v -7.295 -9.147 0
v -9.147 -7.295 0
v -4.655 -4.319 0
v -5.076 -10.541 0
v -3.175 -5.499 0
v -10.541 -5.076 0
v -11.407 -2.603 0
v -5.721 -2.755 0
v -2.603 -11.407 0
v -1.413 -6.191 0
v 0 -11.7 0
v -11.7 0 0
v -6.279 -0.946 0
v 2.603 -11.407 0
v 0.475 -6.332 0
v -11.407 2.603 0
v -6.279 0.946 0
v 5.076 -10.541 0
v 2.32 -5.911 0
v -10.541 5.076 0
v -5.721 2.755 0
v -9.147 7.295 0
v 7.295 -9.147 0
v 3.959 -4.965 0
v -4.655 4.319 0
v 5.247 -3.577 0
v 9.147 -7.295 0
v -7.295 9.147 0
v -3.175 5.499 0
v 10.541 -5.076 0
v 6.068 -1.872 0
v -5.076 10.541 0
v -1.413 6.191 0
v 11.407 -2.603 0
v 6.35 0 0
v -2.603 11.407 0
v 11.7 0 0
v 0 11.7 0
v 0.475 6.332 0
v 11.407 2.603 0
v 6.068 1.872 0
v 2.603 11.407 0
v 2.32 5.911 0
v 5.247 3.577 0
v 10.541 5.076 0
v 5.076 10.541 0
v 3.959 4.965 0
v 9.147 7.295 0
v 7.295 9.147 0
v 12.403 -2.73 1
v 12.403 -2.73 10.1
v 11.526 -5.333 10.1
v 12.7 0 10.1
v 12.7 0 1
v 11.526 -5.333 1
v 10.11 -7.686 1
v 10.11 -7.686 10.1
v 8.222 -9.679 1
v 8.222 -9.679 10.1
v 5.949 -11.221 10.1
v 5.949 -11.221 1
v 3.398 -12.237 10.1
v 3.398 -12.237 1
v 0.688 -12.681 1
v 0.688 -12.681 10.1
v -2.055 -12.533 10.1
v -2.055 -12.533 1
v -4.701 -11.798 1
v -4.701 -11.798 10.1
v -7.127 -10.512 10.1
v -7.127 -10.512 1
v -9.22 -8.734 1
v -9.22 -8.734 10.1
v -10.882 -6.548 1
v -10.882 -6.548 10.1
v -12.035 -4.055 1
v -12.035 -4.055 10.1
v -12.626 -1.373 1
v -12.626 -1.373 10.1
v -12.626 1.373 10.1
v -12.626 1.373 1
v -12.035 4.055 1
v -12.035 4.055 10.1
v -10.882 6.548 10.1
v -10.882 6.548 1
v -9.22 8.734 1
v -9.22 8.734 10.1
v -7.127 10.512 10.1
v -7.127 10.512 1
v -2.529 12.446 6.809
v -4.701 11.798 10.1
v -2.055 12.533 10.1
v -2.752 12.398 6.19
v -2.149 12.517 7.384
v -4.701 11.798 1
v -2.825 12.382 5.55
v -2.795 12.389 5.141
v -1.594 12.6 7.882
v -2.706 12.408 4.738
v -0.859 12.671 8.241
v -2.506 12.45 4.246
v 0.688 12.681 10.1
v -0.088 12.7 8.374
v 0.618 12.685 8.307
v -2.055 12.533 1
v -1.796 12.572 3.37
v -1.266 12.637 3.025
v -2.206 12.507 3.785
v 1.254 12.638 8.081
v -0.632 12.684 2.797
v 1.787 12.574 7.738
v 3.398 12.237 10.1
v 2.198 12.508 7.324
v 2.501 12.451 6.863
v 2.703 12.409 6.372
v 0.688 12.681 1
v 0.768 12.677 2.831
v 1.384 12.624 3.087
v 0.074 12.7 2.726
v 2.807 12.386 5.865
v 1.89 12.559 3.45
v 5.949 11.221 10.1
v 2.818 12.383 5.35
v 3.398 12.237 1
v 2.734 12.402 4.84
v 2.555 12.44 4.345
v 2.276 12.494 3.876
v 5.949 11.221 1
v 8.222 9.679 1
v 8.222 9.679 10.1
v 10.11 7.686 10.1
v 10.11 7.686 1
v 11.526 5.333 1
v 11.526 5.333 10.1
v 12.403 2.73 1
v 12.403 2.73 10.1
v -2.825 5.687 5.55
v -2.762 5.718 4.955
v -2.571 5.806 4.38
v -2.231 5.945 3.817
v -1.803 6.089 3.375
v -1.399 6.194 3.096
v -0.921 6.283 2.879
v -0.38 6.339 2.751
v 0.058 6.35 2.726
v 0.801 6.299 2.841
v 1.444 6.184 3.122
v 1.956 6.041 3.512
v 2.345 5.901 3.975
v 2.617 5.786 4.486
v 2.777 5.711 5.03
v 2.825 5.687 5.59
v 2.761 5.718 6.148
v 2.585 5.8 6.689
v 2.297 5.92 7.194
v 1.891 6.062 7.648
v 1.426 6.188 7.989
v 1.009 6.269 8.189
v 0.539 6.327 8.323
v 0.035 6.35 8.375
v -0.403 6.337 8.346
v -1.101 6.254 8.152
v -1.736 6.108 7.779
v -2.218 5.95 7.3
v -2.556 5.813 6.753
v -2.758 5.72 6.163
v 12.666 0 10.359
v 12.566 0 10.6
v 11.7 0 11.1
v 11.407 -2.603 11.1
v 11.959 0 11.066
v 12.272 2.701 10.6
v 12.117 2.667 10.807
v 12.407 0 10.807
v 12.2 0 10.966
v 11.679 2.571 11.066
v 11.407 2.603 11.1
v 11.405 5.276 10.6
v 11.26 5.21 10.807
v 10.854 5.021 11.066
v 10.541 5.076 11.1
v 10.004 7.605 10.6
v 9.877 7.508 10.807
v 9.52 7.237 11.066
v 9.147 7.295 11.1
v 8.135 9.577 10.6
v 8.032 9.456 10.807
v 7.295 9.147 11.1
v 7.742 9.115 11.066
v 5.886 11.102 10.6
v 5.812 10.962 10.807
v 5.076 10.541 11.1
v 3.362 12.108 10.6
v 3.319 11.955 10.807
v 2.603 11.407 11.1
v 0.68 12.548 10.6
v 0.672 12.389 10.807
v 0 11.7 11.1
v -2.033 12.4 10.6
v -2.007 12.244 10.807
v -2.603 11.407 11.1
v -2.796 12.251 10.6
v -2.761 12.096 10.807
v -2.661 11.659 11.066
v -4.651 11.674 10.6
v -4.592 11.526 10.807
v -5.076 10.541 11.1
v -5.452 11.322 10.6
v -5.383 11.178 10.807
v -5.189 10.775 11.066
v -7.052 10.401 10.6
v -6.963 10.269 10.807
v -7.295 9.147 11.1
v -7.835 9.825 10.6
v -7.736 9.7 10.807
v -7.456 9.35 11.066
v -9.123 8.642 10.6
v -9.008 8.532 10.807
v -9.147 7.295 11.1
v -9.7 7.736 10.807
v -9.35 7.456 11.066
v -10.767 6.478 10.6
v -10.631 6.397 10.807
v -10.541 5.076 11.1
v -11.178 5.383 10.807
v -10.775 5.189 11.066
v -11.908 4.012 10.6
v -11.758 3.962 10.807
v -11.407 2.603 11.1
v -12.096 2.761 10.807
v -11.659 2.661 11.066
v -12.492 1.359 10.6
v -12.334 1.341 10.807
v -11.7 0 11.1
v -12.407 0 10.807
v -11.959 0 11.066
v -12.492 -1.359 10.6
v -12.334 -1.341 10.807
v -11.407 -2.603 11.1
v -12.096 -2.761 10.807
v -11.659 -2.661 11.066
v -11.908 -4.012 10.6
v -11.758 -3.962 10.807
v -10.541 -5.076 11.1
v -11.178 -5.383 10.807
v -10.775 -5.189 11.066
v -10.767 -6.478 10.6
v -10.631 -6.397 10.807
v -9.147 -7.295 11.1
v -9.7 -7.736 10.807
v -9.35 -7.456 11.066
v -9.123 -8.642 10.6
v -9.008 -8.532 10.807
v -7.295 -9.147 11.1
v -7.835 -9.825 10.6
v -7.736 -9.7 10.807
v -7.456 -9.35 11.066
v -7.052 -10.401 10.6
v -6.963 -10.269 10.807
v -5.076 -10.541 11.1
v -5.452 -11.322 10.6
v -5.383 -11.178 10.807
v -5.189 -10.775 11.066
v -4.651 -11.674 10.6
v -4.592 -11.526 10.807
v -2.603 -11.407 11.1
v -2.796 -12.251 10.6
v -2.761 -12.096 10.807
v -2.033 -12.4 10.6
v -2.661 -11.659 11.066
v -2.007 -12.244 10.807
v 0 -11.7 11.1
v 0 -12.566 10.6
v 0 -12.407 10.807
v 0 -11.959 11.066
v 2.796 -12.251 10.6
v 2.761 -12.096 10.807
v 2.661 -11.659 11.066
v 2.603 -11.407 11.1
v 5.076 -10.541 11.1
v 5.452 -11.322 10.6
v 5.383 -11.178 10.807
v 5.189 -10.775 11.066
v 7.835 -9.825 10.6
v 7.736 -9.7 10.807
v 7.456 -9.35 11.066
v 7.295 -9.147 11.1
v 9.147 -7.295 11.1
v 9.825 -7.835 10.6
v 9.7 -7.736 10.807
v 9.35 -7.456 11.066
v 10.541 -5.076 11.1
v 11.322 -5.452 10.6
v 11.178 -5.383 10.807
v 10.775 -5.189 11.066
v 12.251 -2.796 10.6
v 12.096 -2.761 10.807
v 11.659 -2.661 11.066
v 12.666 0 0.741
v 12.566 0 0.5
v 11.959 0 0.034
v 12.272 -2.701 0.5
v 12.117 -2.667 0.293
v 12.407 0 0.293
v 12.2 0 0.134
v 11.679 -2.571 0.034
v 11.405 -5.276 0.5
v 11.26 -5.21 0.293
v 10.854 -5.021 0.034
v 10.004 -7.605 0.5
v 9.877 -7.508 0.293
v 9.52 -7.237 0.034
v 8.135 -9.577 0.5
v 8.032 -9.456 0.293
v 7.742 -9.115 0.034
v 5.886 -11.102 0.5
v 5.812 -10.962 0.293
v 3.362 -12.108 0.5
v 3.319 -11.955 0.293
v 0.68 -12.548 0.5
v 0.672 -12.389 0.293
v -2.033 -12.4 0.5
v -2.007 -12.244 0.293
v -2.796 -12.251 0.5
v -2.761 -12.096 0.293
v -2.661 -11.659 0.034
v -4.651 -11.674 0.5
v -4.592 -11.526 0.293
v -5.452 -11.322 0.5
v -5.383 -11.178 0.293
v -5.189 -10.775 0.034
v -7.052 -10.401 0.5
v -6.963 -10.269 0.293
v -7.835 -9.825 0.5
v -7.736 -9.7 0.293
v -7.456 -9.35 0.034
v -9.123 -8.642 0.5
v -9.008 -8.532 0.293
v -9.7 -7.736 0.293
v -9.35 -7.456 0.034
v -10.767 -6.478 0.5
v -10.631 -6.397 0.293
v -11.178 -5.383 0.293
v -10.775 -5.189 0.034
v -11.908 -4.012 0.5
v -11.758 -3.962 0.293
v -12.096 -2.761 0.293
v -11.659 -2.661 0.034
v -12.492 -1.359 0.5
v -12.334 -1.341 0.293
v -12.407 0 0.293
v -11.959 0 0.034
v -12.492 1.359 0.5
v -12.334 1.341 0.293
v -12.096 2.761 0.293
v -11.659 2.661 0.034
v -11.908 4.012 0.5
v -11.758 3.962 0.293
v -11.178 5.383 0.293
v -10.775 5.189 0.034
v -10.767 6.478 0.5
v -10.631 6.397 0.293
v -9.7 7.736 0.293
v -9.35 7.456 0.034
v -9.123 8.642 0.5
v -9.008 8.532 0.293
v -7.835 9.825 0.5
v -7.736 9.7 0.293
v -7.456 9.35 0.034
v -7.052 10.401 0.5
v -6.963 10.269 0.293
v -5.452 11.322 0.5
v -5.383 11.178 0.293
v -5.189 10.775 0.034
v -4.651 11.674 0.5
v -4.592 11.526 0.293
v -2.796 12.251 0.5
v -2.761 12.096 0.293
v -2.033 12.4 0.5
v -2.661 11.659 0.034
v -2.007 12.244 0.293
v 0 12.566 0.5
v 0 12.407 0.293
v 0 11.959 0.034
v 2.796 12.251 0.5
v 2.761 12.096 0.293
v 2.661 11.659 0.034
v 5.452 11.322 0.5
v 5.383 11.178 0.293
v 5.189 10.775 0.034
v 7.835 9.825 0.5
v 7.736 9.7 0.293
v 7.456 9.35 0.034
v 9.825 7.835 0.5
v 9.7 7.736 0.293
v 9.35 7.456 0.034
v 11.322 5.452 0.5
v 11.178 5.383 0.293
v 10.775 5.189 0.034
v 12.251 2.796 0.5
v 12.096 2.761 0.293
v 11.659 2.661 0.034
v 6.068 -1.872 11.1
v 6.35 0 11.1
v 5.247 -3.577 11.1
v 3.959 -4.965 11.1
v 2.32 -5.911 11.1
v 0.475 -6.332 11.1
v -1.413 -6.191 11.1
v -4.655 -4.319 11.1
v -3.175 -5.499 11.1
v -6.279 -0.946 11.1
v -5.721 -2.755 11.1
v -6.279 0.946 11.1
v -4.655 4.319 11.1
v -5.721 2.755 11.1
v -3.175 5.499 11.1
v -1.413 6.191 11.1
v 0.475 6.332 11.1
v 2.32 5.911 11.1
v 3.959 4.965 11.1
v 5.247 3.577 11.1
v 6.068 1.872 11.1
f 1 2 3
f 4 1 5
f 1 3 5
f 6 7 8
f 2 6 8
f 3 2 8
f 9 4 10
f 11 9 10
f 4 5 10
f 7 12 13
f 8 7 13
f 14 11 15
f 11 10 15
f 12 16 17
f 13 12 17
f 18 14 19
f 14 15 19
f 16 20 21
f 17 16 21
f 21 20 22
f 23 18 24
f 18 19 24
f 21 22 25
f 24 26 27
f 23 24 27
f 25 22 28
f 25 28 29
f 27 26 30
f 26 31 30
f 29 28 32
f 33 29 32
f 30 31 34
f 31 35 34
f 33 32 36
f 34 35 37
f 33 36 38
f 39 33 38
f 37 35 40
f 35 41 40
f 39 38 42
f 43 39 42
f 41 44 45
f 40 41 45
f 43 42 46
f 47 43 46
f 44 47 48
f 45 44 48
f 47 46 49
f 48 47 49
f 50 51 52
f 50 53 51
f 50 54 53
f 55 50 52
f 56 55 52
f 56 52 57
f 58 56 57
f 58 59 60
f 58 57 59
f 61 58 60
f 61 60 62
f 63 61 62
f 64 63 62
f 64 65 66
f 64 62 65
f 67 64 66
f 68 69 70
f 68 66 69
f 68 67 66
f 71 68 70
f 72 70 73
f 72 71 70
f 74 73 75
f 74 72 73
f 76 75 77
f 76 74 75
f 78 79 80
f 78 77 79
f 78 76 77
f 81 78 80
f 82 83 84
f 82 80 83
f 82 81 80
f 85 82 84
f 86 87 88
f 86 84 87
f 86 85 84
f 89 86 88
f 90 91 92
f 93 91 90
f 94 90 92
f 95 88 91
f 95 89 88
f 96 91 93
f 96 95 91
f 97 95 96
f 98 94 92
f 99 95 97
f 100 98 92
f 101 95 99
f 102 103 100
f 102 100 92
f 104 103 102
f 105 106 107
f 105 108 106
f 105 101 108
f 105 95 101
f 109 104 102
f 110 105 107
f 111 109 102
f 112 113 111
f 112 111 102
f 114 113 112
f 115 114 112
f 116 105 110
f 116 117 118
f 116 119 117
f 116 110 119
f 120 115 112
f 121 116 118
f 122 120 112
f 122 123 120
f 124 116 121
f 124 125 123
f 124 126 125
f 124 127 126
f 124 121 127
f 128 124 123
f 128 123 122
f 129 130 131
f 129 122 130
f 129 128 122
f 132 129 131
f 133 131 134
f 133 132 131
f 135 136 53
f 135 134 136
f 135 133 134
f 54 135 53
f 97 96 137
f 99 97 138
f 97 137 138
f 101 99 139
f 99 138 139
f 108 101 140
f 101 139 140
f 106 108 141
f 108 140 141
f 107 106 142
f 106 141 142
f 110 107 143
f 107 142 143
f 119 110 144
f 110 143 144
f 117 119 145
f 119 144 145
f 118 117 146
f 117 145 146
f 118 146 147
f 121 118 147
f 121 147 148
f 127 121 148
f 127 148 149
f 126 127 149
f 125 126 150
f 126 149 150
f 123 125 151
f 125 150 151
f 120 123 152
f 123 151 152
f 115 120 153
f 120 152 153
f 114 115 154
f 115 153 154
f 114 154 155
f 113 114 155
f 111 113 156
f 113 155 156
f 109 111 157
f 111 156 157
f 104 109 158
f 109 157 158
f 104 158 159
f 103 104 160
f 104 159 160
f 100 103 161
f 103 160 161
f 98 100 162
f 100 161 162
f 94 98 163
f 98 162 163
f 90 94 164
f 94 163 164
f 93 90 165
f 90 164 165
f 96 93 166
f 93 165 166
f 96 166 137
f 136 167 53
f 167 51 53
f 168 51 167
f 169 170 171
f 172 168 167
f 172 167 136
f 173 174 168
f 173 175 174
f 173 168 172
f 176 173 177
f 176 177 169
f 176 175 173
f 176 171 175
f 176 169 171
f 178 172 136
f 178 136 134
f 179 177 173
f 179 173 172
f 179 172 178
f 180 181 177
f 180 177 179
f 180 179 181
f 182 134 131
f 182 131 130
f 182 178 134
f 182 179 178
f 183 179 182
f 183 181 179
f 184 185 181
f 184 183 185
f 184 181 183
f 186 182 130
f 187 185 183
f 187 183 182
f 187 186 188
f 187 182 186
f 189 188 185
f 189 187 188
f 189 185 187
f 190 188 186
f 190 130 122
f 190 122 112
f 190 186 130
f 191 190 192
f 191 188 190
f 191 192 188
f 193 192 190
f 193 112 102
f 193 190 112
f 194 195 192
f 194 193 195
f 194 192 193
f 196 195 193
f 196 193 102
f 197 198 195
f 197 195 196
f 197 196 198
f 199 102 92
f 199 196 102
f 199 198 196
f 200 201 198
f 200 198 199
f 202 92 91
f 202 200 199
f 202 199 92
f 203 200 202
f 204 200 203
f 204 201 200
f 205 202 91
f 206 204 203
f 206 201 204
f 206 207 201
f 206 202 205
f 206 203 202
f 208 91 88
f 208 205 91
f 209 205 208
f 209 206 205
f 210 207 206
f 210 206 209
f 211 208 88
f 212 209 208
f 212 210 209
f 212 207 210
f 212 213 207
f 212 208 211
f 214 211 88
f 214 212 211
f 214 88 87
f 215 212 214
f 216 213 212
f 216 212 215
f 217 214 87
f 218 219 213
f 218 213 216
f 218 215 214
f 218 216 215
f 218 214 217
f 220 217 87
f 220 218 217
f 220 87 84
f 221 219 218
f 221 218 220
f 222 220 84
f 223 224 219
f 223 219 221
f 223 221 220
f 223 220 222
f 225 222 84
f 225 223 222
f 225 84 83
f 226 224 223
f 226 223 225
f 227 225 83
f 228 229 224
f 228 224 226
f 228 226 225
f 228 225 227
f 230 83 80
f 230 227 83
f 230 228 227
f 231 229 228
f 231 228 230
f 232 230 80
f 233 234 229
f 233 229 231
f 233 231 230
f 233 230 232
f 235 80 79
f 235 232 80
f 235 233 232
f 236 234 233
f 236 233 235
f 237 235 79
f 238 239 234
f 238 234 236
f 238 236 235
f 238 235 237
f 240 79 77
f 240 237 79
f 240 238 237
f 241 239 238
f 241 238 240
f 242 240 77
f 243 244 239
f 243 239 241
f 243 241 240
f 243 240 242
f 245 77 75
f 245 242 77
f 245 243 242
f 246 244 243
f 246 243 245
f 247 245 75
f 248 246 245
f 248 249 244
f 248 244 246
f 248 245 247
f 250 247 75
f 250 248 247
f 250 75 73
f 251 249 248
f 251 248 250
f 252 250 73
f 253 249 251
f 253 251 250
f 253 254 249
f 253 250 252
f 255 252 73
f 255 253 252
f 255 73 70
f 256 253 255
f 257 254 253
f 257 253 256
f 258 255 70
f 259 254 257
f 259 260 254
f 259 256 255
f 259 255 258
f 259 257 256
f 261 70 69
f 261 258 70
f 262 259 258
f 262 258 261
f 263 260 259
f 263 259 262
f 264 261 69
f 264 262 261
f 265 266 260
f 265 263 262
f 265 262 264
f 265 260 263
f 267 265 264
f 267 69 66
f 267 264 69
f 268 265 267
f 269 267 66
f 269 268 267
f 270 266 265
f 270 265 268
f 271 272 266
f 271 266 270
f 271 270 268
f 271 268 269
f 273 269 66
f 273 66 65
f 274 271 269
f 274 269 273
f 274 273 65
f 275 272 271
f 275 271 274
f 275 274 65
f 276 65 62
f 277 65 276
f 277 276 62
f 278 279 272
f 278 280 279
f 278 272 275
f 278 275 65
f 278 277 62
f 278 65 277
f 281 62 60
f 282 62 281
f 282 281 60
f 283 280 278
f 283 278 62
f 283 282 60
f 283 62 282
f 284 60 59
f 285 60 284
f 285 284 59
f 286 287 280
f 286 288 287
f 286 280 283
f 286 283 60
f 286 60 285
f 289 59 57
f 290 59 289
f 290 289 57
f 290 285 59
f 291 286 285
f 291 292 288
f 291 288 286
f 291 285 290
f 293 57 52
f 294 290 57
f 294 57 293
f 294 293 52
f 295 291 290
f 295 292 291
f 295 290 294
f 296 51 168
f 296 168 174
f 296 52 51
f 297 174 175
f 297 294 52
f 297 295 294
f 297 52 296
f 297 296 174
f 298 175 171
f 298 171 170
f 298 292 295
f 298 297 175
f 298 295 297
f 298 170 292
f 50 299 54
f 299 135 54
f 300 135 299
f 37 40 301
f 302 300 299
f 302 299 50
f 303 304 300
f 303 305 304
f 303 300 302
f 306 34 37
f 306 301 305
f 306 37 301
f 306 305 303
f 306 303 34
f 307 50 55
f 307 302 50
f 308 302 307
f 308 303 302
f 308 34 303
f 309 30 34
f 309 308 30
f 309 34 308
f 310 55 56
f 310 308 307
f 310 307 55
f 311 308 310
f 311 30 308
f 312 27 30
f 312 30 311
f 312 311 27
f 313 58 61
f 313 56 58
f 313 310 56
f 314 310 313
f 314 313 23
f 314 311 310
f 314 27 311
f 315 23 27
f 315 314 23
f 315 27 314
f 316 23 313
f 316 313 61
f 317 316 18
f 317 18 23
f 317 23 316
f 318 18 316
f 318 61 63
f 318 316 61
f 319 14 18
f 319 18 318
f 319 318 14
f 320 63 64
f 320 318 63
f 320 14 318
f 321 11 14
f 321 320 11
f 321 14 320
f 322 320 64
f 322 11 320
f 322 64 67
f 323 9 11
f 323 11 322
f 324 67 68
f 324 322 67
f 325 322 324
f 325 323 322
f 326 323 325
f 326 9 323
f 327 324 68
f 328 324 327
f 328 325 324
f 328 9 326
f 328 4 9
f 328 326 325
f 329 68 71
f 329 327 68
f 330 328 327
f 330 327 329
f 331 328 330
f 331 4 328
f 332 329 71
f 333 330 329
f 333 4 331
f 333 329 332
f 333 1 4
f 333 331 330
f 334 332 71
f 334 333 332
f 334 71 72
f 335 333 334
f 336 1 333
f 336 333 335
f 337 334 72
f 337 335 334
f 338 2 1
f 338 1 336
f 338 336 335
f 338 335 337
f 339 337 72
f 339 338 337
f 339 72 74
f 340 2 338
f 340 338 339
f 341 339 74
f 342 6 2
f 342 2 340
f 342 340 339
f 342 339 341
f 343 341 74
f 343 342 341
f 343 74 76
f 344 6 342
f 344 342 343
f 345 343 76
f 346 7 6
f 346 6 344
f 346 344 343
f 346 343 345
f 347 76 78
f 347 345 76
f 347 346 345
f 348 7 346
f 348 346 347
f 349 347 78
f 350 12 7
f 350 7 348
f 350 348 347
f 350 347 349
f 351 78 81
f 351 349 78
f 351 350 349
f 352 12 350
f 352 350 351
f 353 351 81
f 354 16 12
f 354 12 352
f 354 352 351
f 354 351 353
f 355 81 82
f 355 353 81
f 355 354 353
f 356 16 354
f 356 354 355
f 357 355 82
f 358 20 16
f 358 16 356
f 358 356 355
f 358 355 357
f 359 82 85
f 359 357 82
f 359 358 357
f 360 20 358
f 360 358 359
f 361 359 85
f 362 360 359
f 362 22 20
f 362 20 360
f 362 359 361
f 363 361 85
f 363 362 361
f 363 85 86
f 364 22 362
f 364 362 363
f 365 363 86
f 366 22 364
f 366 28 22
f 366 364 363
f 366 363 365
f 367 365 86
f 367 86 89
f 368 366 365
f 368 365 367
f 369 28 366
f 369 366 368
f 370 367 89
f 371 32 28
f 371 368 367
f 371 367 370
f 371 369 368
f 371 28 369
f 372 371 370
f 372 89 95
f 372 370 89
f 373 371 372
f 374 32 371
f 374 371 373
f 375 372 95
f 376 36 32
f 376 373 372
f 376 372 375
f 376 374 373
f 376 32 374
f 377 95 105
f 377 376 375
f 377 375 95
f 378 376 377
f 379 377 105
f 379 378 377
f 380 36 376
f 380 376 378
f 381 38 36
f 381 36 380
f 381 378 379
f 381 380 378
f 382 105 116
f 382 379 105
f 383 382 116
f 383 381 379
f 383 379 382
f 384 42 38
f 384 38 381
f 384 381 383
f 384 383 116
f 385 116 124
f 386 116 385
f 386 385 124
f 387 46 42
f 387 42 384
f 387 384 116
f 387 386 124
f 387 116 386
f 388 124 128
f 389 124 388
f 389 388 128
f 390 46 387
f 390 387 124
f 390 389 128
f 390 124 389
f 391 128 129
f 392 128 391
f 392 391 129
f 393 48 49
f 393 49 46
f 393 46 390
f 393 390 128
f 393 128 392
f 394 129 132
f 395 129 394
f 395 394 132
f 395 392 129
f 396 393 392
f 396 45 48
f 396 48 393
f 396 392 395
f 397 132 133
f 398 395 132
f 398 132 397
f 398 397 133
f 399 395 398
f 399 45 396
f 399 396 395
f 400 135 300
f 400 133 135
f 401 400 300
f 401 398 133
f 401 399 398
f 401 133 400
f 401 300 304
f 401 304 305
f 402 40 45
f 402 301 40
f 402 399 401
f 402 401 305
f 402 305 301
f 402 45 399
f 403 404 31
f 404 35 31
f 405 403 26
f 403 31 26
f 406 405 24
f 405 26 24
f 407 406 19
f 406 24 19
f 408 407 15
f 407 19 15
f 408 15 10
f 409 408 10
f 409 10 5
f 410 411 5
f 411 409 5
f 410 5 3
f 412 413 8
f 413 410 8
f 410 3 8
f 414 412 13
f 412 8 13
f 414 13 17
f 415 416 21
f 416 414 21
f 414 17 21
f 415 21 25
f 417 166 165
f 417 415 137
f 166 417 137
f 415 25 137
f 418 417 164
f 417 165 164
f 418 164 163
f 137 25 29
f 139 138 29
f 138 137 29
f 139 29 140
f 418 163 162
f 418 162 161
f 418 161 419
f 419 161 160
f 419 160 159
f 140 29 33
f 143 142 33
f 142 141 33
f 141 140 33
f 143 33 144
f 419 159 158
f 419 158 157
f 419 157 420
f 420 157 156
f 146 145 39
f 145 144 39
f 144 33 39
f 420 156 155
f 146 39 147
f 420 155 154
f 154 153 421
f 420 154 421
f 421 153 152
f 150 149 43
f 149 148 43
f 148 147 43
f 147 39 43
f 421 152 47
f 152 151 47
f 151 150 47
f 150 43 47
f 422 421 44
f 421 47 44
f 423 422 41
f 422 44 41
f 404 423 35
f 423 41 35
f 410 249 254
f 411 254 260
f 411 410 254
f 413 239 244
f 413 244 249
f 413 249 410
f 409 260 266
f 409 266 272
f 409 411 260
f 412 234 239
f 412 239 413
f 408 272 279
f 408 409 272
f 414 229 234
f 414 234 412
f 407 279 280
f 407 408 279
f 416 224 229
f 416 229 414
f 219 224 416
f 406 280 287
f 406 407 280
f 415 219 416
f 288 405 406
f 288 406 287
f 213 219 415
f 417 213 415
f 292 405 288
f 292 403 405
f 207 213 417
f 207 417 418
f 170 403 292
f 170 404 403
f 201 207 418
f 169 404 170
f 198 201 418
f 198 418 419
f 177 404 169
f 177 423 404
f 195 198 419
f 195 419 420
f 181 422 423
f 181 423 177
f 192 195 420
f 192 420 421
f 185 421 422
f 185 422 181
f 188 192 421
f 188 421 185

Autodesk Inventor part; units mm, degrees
ref_plane "YZ Plane" through (0, 0, 0) normal (1, 0, 0) x (0, 1, 0)
ref_plane "XZ Plane" through (0, 0, 0) normal (0, 1, 0) x (-1, 0, 0)
ref_plane "XY Plane" through (0, 0, 0) normal (0, 0, 1) x (1, 0, 0)
sketch "Sketch1" plane through (0, 0, 0) normal (0, 0, 1) x (1, 0, 0)
  circle A0 centre (0, 0) radius 12.7
  circle A1 centre (0, 0) radius 6.35
  dimension "d0" = 25.4
  dimension "d1" = 12.7
extrude "Extrusion1" add sketch "Sketch1" along normal blind 11.1
sketch "Sketch2" plane through (0, 0, 0) normal (0, 1, 0) x (-1, 0, 0)
  circle A0 centre (0, 5.55) radius 2.825
  line L0 (12.7, 0) -> (12.7, 11.1) projected
  point P0 (0, 0)
  point P1 (12.7, 5.55)
  dimension "d4" = 5.65
extrude "Extrusion2" cut sketch "Sketch2" along normal through all
fillet "Fillet1" radius 1 2 edges at (-12.7, 0, 11.1) (-12.7, 0, 0)
thread "Thread1" size "1/4-20 UNC" class "2B" standard "ANSI Unified Screw Threads" full length
properties part number "Shaft Collar" material "ABS Plastic"
